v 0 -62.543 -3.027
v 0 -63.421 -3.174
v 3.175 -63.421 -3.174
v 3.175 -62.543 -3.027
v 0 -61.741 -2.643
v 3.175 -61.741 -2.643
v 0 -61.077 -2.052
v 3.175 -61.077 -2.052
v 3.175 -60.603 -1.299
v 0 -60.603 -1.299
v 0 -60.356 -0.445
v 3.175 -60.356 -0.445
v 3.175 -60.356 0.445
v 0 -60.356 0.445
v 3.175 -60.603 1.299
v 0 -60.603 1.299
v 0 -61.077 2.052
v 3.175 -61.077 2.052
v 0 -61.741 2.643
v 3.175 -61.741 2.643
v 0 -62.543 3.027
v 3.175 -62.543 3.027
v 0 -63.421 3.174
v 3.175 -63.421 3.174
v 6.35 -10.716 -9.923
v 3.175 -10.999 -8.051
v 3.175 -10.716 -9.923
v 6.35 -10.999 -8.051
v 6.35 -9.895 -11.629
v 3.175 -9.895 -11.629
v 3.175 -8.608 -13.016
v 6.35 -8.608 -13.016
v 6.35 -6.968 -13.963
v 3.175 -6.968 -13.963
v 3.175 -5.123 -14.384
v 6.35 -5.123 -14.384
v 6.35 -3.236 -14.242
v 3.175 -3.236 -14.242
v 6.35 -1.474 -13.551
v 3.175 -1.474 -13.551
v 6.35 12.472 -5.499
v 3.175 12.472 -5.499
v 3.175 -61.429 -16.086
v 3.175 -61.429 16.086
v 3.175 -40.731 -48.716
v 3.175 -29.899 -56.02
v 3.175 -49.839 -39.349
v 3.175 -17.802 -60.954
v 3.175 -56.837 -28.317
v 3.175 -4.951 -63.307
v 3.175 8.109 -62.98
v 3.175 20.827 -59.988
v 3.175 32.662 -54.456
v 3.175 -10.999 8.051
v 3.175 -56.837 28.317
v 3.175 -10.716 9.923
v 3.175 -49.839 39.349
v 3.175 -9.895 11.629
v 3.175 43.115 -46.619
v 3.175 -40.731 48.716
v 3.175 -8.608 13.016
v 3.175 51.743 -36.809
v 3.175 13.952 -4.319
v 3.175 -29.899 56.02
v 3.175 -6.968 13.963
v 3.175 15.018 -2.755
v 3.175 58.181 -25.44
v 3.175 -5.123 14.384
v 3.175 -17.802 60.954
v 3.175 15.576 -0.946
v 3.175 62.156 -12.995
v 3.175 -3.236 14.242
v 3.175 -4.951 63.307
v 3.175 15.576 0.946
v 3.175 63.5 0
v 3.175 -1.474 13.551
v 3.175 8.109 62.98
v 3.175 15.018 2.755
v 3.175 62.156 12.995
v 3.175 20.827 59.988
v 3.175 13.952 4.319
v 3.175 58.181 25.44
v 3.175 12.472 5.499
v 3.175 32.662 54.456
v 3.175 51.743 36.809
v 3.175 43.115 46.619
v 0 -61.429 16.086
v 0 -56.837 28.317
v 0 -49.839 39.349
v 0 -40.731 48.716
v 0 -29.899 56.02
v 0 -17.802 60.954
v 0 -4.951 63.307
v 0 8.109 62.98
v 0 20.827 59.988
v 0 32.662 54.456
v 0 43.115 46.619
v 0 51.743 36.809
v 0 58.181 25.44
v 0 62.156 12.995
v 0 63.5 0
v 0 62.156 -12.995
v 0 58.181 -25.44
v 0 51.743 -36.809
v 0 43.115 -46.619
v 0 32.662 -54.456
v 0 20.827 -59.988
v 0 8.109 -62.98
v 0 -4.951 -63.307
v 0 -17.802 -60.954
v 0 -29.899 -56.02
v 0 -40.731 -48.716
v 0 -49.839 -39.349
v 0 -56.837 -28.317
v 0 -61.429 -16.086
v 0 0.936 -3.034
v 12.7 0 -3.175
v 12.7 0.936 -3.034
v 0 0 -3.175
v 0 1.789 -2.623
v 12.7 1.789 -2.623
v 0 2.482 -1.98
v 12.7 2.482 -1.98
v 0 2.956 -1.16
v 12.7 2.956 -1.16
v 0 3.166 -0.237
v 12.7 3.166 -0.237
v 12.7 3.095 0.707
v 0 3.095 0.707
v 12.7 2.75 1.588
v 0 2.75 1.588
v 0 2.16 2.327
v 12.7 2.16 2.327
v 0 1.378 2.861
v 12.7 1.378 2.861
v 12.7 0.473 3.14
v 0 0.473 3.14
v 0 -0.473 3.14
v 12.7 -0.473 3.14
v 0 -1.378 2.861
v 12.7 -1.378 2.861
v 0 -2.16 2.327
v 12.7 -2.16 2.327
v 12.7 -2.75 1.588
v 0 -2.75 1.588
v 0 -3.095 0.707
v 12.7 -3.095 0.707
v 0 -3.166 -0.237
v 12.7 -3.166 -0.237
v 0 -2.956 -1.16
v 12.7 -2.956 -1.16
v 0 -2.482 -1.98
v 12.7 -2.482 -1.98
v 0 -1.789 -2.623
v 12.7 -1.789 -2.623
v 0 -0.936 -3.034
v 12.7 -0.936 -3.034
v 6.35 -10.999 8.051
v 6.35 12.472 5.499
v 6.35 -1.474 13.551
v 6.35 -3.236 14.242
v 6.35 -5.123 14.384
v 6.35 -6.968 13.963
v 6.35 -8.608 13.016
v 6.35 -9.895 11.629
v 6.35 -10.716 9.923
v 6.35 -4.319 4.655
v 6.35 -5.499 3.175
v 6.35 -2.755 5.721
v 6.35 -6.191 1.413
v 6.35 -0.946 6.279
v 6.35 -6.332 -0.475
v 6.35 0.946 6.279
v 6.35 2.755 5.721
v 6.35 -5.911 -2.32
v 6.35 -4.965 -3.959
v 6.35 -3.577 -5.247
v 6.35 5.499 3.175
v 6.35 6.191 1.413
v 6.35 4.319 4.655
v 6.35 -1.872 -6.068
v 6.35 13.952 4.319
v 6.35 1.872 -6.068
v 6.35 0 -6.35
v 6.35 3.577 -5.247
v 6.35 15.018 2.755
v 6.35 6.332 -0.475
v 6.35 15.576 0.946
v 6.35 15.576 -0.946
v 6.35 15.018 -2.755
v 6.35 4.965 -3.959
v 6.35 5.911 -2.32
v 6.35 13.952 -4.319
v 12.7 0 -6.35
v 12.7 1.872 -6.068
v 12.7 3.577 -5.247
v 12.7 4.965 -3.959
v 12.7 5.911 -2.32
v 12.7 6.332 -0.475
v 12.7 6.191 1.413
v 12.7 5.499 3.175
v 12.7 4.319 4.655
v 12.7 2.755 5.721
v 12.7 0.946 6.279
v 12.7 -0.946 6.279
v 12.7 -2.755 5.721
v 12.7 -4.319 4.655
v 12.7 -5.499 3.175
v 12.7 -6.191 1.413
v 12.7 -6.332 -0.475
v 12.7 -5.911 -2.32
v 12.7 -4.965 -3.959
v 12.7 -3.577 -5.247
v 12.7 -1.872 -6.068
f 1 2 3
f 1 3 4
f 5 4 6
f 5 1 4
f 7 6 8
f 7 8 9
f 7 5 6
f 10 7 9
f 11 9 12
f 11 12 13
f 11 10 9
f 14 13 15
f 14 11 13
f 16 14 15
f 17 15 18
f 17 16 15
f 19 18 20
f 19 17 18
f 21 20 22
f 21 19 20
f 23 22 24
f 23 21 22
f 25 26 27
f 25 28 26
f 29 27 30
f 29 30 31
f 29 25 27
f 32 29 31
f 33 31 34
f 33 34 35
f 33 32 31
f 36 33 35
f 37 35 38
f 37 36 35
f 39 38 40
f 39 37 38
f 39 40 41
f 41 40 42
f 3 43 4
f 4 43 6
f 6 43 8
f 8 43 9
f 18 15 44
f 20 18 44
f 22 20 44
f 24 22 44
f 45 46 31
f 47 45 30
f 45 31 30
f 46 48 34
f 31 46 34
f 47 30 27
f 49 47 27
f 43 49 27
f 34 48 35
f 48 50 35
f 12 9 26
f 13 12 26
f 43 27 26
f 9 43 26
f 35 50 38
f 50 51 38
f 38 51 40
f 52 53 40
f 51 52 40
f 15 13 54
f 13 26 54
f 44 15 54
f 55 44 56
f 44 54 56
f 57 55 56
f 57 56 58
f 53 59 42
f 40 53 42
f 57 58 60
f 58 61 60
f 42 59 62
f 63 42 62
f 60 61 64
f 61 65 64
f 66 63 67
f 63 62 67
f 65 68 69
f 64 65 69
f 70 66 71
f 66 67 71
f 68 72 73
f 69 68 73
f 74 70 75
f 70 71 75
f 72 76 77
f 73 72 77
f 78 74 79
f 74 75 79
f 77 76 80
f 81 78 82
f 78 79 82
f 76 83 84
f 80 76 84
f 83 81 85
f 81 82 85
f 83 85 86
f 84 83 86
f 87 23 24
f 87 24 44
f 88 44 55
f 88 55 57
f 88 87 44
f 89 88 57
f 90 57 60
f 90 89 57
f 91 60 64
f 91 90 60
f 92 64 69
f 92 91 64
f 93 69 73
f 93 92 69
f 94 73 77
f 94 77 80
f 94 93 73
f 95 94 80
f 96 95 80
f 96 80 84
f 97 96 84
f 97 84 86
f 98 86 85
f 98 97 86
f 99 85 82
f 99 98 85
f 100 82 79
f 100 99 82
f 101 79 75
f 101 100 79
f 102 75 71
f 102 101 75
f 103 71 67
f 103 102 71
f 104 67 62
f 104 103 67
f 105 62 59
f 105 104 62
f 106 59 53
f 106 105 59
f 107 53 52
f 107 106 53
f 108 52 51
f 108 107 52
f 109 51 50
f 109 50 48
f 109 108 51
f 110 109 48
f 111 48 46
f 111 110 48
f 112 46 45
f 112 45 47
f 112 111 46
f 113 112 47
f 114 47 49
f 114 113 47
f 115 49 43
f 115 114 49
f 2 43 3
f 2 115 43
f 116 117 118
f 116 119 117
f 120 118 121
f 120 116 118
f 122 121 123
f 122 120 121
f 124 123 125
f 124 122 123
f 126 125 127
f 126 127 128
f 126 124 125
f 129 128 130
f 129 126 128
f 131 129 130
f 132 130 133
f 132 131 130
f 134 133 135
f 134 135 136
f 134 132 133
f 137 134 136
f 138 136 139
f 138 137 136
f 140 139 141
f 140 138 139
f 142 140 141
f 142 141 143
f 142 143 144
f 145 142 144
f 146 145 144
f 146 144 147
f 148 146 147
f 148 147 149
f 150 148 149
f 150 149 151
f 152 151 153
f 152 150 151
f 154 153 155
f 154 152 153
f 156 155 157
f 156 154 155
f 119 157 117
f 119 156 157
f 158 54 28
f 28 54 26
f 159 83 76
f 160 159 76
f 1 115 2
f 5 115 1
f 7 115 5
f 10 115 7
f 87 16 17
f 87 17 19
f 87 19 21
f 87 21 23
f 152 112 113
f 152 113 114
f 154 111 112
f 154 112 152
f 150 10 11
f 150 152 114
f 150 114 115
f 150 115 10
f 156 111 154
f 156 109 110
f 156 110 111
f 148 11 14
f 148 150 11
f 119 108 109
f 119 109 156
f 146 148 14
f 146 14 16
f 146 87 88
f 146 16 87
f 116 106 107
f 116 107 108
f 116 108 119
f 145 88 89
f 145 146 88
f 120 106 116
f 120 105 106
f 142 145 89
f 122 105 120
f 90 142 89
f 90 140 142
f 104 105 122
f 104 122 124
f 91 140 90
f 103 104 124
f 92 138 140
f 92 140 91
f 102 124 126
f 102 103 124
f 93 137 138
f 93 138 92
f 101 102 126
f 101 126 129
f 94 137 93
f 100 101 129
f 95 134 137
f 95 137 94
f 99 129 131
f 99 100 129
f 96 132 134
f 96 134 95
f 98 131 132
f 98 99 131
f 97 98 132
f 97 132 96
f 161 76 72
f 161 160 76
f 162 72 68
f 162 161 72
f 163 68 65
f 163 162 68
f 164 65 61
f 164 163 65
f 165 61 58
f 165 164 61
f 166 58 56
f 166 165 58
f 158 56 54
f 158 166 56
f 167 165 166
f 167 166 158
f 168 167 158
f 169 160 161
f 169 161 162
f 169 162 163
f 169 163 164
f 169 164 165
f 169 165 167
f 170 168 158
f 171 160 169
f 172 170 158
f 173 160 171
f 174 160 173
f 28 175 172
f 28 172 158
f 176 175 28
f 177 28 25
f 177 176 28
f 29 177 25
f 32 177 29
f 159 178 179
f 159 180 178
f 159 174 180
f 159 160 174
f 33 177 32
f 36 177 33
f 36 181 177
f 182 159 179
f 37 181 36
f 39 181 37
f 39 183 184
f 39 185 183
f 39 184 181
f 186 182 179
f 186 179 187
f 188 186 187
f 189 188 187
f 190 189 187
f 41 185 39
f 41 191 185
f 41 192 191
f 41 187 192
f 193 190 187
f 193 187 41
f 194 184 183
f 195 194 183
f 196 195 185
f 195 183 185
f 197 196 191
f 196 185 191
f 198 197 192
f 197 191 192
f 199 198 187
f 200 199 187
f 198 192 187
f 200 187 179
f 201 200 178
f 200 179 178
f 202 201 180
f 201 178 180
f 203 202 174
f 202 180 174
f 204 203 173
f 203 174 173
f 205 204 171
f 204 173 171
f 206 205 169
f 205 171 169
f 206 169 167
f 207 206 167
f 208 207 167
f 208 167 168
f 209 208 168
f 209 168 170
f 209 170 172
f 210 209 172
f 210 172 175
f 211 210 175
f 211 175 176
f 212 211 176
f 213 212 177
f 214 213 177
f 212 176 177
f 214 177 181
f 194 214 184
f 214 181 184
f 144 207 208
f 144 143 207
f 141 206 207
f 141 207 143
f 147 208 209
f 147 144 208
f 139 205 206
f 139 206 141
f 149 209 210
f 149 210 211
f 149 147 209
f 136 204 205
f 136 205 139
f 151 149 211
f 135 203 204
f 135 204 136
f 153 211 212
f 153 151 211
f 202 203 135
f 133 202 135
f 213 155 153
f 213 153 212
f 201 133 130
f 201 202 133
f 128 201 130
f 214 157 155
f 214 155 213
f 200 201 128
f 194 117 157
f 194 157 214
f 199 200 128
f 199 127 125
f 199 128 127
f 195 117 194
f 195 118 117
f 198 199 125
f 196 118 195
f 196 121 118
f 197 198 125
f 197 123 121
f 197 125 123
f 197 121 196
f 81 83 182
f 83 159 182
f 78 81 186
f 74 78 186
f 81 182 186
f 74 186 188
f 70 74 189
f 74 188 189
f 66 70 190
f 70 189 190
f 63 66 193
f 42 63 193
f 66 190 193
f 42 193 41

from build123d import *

# Parameters (mm, degrees)
SKETCH1_R           = 3.175
BOSS_EXTRUDE1_DEPTH = 3.175
SKETCH3_R           = 3.175
BOSS_EXTRUDE2_DEPTH = 3.175
SKETCH4_R           = 6.35
SKETCH4_R_2         = 3.175
BOSS_EXTRUDE3_DEPTH = 6.35
FILLET1_R           = 6.35


with BuildPart() as part:
    # Sketch1 → Boss-Extrude1 (new body)
    with BuildSketch(Plane(origin=(0, 0, 0), x_dir=(0, 0, -1), z_dir=(1, 0, 0))):
        with BuildLine():
            ThreePointArc((3.174007657, -63.420625), (0, -60.325), (-3.174007657, -63.420625))
            ThreePointArc((-3.174007657, -63.420625), (0, 63.5), (3.174007657, -63.420625))
        make_face()
        Circle(SKETCH1_R, mode=Mode.SUBTRACT)
    extrude(amount=BOSS_EXTRUDE1_DEPTH)

    # Sketch3 → Boss-Extrude2 (add)
    with BuildSketch(Plane(origin=(3.175, 0, 0), x_dir=(0, 0, -1), z_dir=(1, 0, 0))):
        Polygon((0, 21.997045256), (-19.05, -10.998522628), (19.05, -10.998522628), align=None)
        Circle(SKETCH3_R, mode=Mode.SUBTRACT)
    extrude(amount=BOSS_EXTRUDE2_DEPTH)

    # Sketch4 → Boss-Extrude3 (add)
    with BuildSketch(Plane(origin=(6.35, 0, 0), x_dir=(0, 0, -1), z_dir=(1, 0, 0))):
        Circle(SKETCH4_R)
        Circle(SKETCH4_R_2, mode=Mode.SUBTRACT)
    extrude(amount=BOSS_EXTRUDE3_DEPTH)

    # Fillet1
    fillet1_edges = [part.edges().sort_by_distance(p)[0] for p in [
        (4.7625, -10.998522628, -19.05),
        (4.7625, 21.997045256, 0),
        (4.7625, -10.998522628, 19.05),
    ]]
    fillet(fillet1_edges, radius=FILLET1_R)


solid = part.part
